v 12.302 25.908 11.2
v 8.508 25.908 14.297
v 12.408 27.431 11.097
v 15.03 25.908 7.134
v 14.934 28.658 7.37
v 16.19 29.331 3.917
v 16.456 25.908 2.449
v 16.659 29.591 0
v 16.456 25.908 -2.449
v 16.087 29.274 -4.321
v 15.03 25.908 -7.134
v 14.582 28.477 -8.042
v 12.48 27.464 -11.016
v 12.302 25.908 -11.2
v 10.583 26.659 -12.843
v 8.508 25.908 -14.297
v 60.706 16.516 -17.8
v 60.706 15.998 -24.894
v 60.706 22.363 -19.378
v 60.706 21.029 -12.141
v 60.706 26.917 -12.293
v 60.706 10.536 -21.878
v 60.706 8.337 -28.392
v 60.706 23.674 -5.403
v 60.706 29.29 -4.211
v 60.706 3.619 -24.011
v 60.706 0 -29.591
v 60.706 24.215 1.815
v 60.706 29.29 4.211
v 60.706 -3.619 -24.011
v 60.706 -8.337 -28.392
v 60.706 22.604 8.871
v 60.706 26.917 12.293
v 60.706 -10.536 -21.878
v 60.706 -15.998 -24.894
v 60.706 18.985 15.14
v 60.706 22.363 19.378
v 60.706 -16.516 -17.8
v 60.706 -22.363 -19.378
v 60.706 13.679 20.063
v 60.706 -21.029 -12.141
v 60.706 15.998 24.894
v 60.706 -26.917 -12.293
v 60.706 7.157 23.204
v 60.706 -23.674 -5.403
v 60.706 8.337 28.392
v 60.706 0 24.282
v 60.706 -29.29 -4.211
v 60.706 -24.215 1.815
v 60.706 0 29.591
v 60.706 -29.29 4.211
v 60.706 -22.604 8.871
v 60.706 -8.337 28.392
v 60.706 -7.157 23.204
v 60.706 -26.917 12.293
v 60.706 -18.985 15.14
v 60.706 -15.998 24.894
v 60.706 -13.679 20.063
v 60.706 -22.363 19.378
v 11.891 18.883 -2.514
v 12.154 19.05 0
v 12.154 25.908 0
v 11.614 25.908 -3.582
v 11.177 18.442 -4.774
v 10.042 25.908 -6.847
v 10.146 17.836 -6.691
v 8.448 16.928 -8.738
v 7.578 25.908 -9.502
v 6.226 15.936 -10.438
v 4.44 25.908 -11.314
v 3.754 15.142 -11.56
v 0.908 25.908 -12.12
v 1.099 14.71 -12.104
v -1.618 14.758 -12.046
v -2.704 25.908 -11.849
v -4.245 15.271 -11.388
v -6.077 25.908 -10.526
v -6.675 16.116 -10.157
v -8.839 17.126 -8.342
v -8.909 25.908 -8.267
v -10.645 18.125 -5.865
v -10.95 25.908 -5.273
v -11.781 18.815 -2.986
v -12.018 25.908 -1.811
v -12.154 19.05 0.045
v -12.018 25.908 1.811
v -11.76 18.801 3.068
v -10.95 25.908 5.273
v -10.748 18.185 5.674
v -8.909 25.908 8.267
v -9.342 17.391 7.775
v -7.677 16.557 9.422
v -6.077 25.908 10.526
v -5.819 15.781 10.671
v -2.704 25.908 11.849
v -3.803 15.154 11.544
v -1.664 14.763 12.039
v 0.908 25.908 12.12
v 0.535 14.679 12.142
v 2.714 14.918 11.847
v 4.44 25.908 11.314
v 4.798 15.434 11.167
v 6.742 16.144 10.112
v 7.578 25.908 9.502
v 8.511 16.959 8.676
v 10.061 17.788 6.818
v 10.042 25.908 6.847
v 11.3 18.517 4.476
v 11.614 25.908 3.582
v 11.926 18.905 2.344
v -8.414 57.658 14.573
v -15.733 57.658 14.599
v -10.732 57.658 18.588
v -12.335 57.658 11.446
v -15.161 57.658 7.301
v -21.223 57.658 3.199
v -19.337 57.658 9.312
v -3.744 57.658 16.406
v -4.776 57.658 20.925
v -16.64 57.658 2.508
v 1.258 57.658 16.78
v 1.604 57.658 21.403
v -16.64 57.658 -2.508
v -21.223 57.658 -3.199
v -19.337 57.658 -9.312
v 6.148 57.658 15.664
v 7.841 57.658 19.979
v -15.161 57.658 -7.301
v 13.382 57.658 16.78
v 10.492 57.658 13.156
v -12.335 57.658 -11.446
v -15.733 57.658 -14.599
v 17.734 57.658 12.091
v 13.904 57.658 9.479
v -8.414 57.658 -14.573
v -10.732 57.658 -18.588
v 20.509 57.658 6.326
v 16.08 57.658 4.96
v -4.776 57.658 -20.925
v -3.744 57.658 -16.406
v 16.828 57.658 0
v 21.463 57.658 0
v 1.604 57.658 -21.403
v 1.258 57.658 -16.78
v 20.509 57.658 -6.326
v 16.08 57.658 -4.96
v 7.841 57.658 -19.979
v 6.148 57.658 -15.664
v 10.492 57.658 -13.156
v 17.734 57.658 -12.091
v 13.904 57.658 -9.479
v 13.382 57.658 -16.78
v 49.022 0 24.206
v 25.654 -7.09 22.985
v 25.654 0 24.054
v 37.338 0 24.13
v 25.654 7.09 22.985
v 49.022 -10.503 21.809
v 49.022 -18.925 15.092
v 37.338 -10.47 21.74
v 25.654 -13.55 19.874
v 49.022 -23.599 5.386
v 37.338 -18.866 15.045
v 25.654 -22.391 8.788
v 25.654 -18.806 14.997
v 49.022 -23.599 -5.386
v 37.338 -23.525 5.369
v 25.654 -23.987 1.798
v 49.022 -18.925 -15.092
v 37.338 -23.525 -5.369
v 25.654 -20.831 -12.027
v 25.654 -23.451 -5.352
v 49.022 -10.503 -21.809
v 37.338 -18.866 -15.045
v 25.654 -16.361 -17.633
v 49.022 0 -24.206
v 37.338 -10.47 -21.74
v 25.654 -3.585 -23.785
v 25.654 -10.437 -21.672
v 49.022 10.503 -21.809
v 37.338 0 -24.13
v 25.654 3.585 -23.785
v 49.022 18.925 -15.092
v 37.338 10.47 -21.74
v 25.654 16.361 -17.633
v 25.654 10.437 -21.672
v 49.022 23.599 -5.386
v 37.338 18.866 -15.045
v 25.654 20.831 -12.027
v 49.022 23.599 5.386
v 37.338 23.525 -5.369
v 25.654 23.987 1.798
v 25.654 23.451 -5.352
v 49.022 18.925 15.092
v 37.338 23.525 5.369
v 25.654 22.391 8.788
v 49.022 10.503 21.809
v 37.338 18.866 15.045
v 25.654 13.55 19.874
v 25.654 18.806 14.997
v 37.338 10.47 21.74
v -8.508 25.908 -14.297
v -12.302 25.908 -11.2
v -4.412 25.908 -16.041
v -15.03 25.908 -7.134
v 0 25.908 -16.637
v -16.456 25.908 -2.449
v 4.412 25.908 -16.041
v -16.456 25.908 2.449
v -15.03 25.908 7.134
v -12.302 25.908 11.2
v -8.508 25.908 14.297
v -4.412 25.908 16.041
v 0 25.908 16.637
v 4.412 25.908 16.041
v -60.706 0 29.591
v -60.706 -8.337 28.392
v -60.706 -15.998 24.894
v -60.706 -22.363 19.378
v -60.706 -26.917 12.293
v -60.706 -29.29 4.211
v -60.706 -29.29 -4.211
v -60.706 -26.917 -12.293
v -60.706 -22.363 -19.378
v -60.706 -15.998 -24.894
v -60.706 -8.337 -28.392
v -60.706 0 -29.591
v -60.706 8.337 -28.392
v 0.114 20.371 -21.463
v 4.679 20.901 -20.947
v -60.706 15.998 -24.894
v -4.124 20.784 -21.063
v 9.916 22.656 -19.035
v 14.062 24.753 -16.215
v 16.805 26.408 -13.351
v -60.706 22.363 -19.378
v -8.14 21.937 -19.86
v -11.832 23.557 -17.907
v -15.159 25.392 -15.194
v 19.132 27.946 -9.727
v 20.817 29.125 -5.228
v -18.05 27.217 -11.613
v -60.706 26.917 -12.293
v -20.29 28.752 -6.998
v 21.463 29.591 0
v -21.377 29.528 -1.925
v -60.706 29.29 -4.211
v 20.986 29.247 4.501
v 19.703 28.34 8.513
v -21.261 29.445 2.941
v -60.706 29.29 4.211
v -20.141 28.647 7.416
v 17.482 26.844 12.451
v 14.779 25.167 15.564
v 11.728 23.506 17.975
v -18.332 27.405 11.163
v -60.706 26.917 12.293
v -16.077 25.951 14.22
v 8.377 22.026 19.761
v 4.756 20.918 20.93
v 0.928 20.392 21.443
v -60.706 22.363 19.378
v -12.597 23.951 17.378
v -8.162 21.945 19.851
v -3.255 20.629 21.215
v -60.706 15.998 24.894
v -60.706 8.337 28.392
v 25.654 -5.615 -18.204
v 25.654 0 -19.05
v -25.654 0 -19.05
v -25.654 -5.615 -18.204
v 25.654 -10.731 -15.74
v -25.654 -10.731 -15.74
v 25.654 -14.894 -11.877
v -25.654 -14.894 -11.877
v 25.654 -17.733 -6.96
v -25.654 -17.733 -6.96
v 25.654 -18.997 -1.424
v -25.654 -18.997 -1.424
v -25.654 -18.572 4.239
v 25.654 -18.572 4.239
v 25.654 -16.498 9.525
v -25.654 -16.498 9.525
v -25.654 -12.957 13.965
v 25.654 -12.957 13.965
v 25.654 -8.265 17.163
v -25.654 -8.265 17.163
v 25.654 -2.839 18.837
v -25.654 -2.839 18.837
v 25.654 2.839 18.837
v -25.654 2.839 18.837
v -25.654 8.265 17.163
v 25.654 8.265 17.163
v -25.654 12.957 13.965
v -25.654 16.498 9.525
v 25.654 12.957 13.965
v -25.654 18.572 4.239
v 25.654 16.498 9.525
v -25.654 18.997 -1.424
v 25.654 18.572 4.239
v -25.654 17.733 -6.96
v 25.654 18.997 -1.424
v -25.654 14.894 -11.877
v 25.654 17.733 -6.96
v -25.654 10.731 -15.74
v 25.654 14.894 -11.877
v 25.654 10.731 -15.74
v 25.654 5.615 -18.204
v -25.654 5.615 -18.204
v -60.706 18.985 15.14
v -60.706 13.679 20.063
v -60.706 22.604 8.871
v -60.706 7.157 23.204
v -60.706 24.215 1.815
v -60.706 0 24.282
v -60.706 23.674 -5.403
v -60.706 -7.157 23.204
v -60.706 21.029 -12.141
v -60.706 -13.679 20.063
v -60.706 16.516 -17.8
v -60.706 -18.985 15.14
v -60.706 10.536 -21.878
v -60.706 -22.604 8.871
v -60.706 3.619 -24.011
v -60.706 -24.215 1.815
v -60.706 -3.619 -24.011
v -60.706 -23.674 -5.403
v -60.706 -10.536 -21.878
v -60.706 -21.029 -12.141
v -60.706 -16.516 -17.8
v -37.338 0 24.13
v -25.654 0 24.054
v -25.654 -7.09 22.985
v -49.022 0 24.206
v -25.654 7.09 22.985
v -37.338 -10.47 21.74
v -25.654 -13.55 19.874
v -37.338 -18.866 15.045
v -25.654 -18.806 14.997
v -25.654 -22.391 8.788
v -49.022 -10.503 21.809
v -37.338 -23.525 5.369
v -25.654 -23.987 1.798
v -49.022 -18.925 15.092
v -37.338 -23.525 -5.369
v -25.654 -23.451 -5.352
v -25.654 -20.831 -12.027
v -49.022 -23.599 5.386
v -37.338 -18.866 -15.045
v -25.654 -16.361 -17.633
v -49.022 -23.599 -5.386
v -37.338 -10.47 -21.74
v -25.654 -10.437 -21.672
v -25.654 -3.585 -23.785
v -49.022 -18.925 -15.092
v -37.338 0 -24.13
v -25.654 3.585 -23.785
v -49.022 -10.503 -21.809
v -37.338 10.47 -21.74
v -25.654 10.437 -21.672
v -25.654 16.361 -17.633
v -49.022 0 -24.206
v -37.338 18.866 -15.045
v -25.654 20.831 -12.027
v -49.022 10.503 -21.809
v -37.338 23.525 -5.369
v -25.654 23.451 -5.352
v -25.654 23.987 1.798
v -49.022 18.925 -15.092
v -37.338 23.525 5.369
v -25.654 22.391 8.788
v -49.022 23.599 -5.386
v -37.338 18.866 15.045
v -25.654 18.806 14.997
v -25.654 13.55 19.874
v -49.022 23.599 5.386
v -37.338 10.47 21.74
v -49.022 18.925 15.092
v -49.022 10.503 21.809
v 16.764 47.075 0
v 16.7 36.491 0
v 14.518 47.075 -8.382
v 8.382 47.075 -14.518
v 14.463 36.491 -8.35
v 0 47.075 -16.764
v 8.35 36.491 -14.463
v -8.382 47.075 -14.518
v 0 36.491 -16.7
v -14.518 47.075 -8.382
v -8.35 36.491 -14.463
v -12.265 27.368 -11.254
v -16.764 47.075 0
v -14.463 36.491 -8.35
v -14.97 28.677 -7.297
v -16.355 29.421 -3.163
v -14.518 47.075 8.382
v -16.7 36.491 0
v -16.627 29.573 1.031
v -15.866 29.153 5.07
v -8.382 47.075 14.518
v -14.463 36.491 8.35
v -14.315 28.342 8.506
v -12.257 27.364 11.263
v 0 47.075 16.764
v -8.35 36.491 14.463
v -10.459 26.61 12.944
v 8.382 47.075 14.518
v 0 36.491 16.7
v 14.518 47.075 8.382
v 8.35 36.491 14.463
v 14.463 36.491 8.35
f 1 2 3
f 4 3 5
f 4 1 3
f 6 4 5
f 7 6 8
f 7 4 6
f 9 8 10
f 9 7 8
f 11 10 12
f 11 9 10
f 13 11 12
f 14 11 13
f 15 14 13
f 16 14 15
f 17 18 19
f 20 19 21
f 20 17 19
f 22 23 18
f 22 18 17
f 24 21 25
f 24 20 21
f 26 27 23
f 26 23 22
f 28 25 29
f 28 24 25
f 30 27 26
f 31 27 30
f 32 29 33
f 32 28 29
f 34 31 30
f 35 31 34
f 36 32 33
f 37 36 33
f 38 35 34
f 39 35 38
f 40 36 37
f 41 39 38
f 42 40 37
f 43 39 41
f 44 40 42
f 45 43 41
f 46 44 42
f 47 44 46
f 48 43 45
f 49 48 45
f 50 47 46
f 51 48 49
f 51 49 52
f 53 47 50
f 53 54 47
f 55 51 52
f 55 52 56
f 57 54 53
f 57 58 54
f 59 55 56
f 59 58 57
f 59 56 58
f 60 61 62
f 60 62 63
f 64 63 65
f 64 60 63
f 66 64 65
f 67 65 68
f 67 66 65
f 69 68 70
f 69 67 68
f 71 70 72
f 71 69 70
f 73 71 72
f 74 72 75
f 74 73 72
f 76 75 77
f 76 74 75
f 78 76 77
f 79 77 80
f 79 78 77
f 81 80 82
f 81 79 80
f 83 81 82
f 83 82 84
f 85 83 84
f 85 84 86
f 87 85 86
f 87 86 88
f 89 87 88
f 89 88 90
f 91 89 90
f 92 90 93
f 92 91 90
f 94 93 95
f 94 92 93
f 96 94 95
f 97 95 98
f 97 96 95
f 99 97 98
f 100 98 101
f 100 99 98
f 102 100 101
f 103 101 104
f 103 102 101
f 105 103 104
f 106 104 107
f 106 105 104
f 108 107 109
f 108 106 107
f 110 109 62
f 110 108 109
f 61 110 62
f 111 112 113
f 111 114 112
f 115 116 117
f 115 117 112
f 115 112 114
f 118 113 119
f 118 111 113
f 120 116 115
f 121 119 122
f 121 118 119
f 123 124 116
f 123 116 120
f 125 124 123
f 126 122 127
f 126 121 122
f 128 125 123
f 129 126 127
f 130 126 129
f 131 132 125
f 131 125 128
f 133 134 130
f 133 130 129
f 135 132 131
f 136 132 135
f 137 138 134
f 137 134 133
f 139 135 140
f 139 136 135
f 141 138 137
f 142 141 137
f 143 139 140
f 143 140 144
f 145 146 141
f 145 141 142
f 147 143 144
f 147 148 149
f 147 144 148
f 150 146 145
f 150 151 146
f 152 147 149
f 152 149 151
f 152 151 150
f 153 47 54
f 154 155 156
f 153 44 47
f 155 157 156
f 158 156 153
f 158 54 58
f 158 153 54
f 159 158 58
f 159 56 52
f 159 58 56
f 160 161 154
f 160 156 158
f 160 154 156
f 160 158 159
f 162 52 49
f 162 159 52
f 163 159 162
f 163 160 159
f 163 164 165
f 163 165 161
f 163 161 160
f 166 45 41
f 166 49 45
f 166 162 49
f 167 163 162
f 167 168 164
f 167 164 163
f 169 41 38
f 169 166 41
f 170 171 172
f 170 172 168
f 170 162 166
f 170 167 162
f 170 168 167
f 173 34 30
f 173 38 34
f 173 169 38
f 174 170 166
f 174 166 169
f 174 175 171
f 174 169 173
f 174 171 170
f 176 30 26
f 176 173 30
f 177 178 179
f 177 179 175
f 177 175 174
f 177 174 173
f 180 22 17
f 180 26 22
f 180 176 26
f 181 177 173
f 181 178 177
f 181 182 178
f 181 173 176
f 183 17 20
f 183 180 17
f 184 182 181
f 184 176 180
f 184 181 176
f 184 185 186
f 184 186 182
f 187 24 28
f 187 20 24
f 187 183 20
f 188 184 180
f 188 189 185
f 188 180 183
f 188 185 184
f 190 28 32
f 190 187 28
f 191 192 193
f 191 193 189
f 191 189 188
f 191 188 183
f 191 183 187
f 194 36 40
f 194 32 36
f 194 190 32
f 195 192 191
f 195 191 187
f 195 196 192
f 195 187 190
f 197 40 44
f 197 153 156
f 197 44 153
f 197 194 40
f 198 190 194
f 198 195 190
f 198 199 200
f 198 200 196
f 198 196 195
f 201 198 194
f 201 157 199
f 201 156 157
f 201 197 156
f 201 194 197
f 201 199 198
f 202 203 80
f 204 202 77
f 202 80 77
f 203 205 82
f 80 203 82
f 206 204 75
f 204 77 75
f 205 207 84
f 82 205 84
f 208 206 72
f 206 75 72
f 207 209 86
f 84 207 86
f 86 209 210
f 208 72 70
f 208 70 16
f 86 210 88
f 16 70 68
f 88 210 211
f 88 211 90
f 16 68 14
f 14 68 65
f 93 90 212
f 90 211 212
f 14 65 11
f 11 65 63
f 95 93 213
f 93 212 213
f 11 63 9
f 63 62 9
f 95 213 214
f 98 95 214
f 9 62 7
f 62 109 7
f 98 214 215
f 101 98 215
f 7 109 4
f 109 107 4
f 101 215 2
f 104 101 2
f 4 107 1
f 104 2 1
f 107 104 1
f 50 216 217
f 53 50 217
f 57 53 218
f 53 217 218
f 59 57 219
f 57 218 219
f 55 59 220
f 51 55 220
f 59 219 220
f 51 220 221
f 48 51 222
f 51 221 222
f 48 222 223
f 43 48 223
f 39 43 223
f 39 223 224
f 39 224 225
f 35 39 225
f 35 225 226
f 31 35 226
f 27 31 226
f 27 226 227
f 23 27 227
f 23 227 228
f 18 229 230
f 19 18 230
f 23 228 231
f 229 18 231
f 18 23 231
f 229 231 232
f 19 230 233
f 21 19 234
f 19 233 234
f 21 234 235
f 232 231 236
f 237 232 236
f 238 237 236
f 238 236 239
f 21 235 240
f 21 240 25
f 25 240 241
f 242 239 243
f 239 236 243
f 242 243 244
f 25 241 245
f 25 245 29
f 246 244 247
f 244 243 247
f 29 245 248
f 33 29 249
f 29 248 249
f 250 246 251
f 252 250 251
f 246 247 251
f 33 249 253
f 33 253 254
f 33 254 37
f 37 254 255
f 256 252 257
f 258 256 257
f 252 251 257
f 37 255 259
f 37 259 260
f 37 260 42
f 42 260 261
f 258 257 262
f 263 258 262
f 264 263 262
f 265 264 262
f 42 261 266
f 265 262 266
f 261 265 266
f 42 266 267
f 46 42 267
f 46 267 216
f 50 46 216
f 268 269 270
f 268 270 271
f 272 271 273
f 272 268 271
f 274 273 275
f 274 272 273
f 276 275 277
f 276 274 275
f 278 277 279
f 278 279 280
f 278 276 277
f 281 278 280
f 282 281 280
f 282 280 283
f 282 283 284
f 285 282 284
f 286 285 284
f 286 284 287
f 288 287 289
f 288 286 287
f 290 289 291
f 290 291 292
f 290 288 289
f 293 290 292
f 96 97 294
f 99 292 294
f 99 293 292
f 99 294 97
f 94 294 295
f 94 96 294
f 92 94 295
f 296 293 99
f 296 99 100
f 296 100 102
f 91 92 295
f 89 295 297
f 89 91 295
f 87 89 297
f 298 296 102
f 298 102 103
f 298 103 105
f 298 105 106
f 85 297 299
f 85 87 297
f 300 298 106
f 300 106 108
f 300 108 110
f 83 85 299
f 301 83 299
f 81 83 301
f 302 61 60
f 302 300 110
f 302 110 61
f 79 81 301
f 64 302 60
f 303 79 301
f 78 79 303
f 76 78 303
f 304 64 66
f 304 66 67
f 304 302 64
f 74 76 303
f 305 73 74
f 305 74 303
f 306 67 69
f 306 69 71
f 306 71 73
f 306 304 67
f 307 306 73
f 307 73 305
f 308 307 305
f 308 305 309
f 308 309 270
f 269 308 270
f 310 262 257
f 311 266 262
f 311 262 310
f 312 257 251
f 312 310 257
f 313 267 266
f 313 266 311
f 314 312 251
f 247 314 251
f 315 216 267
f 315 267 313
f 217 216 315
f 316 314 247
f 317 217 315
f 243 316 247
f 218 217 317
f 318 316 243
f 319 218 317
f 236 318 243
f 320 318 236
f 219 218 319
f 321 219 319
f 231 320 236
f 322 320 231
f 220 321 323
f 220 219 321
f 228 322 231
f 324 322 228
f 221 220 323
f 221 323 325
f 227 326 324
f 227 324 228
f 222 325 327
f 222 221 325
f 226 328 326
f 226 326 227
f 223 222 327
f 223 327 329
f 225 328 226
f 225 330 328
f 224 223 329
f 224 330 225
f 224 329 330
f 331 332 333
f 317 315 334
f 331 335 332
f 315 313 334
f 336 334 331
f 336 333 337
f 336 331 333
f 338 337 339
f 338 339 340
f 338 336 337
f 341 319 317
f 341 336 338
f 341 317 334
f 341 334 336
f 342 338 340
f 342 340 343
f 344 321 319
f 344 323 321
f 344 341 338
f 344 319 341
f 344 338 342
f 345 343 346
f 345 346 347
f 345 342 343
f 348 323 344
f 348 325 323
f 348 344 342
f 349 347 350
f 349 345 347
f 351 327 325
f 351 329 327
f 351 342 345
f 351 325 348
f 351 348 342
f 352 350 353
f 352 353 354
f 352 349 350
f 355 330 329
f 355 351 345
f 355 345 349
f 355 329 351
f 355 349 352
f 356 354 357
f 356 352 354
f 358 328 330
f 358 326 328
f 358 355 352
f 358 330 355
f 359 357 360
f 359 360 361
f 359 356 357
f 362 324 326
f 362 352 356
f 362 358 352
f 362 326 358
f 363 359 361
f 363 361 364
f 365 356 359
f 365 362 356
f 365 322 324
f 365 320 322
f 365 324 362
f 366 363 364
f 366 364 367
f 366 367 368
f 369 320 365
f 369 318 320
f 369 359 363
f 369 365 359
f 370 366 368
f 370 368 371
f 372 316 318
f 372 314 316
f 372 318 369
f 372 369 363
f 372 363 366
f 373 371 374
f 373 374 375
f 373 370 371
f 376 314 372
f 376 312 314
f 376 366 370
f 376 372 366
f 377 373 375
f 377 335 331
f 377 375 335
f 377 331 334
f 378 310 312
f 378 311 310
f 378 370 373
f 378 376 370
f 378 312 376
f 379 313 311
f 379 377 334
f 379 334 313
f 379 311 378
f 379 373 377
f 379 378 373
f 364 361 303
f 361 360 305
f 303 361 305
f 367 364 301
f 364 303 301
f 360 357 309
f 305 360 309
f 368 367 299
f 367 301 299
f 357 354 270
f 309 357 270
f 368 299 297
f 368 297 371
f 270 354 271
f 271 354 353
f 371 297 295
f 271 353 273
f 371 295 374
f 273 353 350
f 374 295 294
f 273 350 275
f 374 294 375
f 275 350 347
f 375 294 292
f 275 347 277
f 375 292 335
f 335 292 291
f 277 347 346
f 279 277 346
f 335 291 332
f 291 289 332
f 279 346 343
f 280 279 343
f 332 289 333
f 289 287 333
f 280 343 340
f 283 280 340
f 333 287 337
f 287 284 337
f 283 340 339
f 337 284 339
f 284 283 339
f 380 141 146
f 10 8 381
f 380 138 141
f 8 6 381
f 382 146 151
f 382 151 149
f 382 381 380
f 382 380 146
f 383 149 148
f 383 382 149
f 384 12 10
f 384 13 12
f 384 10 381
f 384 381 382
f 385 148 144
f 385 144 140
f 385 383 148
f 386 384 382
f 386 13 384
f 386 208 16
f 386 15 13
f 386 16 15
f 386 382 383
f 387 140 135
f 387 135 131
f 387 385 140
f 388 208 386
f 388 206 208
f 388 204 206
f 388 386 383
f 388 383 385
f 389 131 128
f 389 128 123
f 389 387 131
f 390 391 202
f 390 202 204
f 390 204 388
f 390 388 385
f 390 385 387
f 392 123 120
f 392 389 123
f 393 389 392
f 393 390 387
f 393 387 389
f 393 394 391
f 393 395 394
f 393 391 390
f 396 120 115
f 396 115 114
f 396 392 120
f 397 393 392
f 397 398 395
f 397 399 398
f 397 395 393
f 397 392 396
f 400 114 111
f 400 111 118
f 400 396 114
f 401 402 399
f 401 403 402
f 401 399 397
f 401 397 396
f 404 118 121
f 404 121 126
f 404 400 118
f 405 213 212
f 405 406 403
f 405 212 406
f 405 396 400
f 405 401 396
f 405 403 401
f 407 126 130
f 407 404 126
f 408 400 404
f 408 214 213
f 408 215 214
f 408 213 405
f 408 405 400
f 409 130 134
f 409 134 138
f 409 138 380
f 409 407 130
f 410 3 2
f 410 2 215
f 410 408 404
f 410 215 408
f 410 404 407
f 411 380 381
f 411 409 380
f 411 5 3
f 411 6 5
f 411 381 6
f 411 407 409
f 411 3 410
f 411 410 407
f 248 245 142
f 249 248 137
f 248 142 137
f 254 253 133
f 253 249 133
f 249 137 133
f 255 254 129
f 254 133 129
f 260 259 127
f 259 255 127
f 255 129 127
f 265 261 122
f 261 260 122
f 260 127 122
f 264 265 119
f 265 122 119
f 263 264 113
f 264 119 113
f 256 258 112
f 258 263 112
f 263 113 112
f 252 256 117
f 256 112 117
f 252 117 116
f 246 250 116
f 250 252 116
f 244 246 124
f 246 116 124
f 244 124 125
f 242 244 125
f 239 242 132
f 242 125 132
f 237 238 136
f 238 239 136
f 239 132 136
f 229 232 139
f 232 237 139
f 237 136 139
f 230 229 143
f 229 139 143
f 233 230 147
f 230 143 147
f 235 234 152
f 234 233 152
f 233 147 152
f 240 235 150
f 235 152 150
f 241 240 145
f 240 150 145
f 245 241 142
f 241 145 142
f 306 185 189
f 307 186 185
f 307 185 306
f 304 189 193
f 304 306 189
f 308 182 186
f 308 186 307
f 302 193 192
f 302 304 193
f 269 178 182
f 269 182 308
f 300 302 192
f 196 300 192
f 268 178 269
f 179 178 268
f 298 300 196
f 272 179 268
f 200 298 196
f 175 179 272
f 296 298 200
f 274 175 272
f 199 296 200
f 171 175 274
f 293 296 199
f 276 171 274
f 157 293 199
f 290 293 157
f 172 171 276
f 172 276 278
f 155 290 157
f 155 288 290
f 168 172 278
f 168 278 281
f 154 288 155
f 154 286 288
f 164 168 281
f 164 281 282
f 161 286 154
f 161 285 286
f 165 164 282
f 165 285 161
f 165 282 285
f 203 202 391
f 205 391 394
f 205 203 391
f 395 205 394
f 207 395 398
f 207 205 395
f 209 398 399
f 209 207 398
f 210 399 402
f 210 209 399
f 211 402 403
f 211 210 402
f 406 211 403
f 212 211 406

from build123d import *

# Parameters (mm, degrees)
SKETCH4_R           = 29.591
BOSS_EXTRUDE1_DEPTH = 51.308
SKETCH5_R           = 21.463
BOSS_EXTRUDE2_DEPTH = 25.908


with BuildPart() as part:
    # Sketch1 → Revolve1 (revolve)
    with BuildSketch(Plane.XY, mode=Mode.PRIVATE) as revolve1_sk:
        Polygon((-60.706, -29.591), (-25.654, -29.591), (-25.654, -24.0538), (-60.706, -24.2824), align=None)
        Polygon((60.706, -24.2824), (25.654, -24.0538), (25.654, -29.591), (60.706, -29.591), align=None)
    revolve(revolve1_sk.sketch.rotate(Axis((-60.706, 0, 0), (1, 0, 0)), 270), axis=Axis((-60.706, 0, 0), (1, 0, 0)))



with BuildPart() as body_2:
    # Sketch2 → Revolve2 (revolve)
    with BuildSketch(Plane.XY):
        Polygon((16.8275, 57.658), (16.637, 25.908), (21.463, 25.908), (21.463, 57.658), align=None)
    revolve(axis=Axis((0, 0, 0), (0, 1, 0)))


with BuildPart() as part_1:
    add(part.part)

    add(body_2.part)  # Boss-Extrude1 merges body 2
    # Sketch4 → Boss-Extrude1 (add)
    with BuildSketch(Plane(origin=(-25.654, 0, 0), x_dir=(0, 0, -1), z_dir=(1, 0, 0))):
        with Locations(Location((0, 0, 0), (0, 0, 180))):
            Circle(SKETCH4_R)
    extrude(amount=BOSS_EXTRUDE1_DEPTH)

    # Sketch5 → Boss-Extrude2 (add)
    with BuildSketch(Plane.XZ.offset(-25.908)):
        Circle(SKETCH5_R)
    extrude(amount=BOSS_EXTRUDE2_DEPTH)

    # Sketch6 → Cut-Revolve1 (revolve, cut)
    with BuildSketch(Plane.XY, mode=Mode.PRIVATE) as cut_revolve1_sk:
        Polygon((-60.706, -24.2824), (-25.654, -24.0538), (-25.654, -19.05), (25.654, -19.05), (25.654, -24.0538), (60.706, -24.2824), (60.706, 0), (-60.706, 0), align=None)
    revolve(cut_revolve1_sk.sketch.rotate(Axis((60.706, 0, 0), (-1, 0, 0)), 270), axis=Axis((60.706, 0, 0), (-1, 0, 0)), mode=Mode.SUBTRACT)

    # Sketch7 → Cut-Revolve2 (revolve, cut)
    with BuildSketch(Plane.XY):
        Polygon((16.8275, 57.658), (16.637, 25.908), (12.1539, 25.908), (12.1539, 0), (0, 0), (0, 57.658), align=None)
    revolve(axis=Axis((0, 0, 0), (0, 1, 0)), mode=Mode.SUBTRACT)


solid = part_1.part
